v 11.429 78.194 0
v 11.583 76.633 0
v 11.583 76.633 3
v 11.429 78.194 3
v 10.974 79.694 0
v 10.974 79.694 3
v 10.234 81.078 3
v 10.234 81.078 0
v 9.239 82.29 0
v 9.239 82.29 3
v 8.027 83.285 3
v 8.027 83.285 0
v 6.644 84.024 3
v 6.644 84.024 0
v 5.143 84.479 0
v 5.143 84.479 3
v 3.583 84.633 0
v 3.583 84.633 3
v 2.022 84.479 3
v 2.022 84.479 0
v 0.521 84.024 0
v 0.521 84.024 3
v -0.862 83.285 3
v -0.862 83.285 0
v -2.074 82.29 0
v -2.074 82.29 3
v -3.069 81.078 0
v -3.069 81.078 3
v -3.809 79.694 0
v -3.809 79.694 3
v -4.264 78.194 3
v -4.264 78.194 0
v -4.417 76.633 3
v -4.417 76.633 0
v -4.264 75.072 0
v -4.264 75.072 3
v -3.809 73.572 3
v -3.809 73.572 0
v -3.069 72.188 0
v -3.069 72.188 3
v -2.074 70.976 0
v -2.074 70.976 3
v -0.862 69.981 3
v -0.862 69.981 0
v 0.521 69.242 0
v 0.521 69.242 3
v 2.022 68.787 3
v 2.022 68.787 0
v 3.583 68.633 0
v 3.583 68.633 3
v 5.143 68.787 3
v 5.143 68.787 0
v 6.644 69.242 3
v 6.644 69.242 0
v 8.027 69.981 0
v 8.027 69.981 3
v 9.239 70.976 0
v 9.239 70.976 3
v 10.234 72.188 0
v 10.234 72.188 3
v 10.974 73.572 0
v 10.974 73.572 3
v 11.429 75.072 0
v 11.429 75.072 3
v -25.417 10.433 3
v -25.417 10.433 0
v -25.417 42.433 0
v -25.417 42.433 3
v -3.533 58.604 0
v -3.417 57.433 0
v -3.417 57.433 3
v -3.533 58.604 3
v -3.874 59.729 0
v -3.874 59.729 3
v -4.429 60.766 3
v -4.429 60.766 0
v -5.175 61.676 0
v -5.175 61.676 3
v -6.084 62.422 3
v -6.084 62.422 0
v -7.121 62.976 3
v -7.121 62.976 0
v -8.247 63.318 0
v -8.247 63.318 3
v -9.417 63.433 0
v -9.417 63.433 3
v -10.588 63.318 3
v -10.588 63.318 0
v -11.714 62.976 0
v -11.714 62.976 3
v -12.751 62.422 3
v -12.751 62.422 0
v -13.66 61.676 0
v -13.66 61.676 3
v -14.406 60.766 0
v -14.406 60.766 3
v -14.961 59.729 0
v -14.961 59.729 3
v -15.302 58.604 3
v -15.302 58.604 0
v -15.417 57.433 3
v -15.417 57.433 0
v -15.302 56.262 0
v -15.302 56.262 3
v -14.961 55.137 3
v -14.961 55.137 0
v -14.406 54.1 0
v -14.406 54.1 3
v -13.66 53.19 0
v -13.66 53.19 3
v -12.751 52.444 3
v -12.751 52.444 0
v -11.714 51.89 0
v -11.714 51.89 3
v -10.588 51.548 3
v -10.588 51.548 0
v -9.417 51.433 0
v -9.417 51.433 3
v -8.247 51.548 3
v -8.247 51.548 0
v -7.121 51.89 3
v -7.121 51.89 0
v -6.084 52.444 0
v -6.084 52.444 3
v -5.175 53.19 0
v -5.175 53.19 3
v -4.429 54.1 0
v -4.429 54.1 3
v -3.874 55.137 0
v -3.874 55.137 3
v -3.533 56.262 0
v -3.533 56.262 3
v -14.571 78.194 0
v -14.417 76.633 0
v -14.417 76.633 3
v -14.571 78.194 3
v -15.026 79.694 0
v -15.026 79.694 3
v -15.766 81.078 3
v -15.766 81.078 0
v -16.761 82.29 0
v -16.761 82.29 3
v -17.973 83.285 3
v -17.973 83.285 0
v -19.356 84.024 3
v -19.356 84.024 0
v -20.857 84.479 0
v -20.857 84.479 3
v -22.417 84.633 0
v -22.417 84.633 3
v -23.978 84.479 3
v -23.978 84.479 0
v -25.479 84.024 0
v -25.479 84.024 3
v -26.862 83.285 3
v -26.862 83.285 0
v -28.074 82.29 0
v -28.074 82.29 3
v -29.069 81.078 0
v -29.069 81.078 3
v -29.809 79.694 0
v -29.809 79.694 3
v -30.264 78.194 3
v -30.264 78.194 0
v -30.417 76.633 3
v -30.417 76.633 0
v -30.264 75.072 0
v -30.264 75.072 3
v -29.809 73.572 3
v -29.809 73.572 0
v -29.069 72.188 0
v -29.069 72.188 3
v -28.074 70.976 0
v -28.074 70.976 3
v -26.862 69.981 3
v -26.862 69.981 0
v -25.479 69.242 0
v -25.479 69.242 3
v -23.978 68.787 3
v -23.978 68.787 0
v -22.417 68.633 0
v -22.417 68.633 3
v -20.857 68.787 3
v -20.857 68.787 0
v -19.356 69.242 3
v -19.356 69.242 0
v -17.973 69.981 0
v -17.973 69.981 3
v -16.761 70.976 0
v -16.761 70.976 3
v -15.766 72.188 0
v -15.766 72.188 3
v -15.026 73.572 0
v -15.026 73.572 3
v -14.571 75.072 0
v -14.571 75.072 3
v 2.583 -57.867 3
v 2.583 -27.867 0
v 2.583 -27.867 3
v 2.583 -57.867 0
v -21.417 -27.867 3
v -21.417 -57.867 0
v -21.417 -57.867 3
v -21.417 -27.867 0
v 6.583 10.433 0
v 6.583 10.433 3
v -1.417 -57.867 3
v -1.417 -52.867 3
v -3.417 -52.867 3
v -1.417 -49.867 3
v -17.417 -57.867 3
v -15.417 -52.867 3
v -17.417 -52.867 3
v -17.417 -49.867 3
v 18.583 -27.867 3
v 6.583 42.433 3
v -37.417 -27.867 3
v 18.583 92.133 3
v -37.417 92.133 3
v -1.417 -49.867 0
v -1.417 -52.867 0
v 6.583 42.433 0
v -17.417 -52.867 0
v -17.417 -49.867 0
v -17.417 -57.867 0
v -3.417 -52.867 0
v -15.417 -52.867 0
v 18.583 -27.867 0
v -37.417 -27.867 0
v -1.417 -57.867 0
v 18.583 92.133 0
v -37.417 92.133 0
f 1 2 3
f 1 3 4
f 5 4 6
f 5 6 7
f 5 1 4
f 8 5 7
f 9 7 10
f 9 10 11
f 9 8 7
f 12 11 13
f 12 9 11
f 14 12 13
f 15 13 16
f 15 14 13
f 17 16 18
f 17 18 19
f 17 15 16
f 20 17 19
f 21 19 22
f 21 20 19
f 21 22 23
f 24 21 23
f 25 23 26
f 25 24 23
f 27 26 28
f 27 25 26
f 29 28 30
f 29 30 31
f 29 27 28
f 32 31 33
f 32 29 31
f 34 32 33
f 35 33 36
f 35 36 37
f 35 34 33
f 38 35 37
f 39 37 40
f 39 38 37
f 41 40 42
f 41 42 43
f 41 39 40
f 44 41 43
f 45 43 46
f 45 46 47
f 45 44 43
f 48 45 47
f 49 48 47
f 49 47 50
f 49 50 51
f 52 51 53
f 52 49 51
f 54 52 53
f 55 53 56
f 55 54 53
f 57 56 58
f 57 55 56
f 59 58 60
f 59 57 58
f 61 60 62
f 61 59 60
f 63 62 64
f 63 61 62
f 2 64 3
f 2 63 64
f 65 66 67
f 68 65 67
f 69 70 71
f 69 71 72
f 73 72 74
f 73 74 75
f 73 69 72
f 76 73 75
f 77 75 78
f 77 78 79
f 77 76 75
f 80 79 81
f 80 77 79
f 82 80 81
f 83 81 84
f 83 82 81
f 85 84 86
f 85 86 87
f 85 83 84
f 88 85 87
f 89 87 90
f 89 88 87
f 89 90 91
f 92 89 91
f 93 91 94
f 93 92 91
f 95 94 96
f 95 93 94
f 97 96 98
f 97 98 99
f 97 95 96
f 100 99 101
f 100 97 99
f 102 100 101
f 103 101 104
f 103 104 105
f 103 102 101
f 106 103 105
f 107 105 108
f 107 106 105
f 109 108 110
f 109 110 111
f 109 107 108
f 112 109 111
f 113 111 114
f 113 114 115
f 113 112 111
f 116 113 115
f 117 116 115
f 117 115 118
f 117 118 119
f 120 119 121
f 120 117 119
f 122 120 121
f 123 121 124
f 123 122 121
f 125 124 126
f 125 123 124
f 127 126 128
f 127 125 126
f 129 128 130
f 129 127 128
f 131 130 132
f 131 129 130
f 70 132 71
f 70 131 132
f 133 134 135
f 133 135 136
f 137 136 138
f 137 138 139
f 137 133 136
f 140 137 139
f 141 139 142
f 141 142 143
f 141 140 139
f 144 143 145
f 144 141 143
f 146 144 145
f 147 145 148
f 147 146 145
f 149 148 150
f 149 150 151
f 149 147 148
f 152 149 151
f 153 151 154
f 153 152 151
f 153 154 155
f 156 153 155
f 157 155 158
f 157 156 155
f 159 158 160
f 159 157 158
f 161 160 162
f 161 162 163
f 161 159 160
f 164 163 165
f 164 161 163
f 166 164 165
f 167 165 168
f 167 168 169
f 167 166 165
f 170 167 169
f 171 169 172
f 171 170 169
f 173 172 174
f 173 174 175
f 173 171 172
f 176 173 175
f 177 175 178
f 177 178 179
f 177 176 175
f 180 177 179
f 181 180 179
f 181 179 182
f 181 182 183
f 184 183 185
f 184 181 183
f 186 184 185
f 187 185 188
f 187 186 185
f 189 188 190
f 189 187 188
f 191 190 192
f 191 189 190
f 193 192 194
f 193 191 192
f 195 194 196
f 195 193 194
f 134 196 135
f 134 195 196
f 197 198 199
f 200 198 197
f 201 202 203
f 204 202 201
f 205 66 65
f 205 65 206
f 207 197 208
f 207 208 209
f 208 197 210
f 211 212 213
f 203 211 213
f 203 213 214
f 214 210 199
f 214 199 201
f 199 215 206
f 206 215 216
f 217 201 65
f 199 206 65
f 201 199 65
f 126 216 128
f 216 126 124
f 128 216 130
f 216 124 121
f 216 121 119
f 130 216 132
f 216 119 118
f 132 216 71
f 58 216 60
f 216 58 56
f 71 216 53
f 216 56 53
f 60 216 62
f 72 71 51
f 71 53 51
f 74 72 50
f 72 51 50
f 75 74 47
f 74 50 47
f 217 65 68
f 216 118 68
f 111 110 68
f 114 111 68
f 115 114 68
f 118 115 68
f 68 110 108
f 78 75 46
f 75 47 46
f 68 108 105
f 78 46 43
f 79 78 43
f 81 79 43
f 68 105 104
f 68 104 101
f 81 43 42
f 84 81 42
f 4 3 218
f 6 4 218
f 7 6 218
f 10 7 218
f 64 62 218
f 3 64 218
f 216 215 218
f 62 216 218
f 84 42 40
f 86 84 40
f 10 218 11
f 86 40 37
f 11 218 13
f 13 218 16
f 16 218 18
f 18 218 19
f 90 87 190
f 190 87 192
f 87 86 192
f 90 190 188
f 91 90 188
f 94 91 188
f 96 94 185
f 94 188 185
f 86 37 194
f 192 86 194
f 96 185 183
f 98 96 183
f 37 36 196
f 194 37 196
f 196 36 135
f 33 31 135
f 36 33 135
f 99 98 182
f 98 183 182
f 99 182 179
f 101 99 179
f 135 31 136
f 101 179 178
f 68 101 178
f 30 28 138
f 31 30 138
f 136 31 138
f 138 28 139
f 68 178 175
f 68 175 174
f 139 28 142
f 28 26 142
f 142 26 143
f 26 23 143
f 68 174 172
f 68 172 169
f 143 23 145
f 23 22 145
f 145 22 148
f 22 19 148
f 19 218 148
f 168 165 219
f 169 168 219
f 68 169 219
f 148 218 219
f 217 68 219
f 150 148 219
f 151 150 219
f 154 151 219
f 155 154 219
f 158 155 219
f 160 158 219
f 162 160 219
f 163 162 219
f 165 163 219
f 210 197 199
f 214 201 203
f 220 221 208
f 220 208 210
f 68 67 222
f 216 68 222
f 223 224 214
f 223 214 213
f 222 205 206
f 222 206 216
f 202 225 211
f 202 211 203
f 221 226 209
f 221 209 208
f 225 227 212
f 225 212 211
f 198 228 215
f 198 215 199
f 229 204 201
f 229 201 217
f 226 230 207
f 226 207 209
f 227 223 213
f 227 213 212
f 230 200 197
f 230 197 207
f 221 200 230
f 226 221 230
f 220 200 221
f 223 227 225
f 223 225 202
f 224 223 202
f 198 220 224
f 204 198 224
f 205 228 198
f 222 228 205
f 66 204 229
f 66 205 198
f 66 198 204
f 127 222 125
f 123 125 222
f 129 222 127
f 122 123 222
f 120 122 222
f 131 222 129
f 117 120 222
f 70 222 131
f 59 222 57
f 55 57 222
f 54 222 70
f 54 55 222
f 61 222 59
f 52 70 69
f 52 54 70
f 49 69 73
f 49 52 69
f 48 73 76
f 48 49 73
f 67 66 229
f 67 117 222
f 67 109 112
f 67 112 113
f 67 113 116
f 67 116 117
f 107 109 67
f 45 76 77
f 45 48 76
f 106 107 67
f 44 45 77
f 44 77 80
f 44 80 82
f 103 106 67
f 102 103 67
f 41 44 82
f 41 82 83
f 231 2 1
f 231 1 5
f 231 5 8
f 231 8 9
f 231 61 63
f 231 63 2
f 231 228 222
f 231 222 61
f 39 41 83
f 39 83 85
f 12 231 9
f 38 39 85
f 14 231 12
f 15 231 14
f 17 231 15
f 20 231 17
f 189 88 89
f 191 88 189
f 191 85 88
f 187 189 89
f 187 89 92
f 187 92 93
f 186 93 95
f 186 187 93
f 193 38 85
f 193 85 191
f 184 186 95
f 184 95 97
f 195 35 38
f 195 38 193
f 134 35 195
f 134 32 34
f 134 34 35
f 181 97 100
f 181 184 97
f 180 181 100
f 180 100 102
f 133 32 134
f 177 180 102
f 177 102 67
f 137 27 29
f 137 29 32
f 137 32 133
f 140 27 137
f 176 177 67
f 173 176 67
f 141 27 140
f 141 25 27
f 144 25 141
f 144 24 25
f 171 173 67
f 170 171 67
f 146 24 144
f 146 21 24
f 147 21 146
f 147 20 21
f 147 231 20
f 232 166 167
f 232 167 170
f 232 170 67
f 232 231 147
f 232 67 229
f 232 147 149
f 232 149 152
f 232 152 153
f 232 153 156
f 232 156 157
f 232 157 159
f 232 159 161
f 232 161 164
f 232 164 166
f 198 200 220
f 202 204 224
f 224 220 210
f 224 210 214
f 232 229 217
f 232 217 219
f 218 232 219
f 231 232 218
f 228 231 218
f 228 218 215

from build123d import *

# Parameters (mm, degrees)
MODEL_R                 = 6
MODEL_R_2               = 8
MODEL_W                 = 32
MODEL_H                 = 32
SALIENTE_EXTRUIR1_DEPTH = 3


with BuildPart() as part:
    # Model → Saliente-Extruir1 (new body)
    with BuildSketch(Plane.XY):
        Polygon((18.582508913, 92.133016607), (18.582508913, -27.866983393), (2.582508913, -27.866983393), (2.582508913, -57.866983393), (-1.417491087, -57.866983393), (-3.417491087, -52.866983393), (-1.417491087, -52.866983393), (-1.417491087, -49.866983393), (-17.417491087, -49.866983393), (-17.417491087, -52.866983393), (-15.417491087, -52.866983393), (-17.417491087, -57.866983393), (-21.417491087, -57.866983393), (-21.417491087, -27.866983393), (-37.417491087, -27.866983393), (-37.417491087, 92.133016607), align=None)
        with Locations((-9.417491087, 57.433016607)):
            Circle(MODEL_R, mode=Mode.SUBTRACT)
        with Locations((-22.417491087, 76.633016607)):
            Circle(MODEL_R_2, mode=Mode.SUBTRACT)
        with Locations((3.582508913, 76.633016607)):
            Circle(MODEL_R_2, mode=Mode.SUBTRACT)
        with Locations((-9.417491087, 26.433016607)):
            Rectangle(MODEL_W, MODEL_H, mode=Mode.SUBTRACT)
    extrude(amount=SALIENTE_EXTRUIR1_DEPTH)


solid = part.part
